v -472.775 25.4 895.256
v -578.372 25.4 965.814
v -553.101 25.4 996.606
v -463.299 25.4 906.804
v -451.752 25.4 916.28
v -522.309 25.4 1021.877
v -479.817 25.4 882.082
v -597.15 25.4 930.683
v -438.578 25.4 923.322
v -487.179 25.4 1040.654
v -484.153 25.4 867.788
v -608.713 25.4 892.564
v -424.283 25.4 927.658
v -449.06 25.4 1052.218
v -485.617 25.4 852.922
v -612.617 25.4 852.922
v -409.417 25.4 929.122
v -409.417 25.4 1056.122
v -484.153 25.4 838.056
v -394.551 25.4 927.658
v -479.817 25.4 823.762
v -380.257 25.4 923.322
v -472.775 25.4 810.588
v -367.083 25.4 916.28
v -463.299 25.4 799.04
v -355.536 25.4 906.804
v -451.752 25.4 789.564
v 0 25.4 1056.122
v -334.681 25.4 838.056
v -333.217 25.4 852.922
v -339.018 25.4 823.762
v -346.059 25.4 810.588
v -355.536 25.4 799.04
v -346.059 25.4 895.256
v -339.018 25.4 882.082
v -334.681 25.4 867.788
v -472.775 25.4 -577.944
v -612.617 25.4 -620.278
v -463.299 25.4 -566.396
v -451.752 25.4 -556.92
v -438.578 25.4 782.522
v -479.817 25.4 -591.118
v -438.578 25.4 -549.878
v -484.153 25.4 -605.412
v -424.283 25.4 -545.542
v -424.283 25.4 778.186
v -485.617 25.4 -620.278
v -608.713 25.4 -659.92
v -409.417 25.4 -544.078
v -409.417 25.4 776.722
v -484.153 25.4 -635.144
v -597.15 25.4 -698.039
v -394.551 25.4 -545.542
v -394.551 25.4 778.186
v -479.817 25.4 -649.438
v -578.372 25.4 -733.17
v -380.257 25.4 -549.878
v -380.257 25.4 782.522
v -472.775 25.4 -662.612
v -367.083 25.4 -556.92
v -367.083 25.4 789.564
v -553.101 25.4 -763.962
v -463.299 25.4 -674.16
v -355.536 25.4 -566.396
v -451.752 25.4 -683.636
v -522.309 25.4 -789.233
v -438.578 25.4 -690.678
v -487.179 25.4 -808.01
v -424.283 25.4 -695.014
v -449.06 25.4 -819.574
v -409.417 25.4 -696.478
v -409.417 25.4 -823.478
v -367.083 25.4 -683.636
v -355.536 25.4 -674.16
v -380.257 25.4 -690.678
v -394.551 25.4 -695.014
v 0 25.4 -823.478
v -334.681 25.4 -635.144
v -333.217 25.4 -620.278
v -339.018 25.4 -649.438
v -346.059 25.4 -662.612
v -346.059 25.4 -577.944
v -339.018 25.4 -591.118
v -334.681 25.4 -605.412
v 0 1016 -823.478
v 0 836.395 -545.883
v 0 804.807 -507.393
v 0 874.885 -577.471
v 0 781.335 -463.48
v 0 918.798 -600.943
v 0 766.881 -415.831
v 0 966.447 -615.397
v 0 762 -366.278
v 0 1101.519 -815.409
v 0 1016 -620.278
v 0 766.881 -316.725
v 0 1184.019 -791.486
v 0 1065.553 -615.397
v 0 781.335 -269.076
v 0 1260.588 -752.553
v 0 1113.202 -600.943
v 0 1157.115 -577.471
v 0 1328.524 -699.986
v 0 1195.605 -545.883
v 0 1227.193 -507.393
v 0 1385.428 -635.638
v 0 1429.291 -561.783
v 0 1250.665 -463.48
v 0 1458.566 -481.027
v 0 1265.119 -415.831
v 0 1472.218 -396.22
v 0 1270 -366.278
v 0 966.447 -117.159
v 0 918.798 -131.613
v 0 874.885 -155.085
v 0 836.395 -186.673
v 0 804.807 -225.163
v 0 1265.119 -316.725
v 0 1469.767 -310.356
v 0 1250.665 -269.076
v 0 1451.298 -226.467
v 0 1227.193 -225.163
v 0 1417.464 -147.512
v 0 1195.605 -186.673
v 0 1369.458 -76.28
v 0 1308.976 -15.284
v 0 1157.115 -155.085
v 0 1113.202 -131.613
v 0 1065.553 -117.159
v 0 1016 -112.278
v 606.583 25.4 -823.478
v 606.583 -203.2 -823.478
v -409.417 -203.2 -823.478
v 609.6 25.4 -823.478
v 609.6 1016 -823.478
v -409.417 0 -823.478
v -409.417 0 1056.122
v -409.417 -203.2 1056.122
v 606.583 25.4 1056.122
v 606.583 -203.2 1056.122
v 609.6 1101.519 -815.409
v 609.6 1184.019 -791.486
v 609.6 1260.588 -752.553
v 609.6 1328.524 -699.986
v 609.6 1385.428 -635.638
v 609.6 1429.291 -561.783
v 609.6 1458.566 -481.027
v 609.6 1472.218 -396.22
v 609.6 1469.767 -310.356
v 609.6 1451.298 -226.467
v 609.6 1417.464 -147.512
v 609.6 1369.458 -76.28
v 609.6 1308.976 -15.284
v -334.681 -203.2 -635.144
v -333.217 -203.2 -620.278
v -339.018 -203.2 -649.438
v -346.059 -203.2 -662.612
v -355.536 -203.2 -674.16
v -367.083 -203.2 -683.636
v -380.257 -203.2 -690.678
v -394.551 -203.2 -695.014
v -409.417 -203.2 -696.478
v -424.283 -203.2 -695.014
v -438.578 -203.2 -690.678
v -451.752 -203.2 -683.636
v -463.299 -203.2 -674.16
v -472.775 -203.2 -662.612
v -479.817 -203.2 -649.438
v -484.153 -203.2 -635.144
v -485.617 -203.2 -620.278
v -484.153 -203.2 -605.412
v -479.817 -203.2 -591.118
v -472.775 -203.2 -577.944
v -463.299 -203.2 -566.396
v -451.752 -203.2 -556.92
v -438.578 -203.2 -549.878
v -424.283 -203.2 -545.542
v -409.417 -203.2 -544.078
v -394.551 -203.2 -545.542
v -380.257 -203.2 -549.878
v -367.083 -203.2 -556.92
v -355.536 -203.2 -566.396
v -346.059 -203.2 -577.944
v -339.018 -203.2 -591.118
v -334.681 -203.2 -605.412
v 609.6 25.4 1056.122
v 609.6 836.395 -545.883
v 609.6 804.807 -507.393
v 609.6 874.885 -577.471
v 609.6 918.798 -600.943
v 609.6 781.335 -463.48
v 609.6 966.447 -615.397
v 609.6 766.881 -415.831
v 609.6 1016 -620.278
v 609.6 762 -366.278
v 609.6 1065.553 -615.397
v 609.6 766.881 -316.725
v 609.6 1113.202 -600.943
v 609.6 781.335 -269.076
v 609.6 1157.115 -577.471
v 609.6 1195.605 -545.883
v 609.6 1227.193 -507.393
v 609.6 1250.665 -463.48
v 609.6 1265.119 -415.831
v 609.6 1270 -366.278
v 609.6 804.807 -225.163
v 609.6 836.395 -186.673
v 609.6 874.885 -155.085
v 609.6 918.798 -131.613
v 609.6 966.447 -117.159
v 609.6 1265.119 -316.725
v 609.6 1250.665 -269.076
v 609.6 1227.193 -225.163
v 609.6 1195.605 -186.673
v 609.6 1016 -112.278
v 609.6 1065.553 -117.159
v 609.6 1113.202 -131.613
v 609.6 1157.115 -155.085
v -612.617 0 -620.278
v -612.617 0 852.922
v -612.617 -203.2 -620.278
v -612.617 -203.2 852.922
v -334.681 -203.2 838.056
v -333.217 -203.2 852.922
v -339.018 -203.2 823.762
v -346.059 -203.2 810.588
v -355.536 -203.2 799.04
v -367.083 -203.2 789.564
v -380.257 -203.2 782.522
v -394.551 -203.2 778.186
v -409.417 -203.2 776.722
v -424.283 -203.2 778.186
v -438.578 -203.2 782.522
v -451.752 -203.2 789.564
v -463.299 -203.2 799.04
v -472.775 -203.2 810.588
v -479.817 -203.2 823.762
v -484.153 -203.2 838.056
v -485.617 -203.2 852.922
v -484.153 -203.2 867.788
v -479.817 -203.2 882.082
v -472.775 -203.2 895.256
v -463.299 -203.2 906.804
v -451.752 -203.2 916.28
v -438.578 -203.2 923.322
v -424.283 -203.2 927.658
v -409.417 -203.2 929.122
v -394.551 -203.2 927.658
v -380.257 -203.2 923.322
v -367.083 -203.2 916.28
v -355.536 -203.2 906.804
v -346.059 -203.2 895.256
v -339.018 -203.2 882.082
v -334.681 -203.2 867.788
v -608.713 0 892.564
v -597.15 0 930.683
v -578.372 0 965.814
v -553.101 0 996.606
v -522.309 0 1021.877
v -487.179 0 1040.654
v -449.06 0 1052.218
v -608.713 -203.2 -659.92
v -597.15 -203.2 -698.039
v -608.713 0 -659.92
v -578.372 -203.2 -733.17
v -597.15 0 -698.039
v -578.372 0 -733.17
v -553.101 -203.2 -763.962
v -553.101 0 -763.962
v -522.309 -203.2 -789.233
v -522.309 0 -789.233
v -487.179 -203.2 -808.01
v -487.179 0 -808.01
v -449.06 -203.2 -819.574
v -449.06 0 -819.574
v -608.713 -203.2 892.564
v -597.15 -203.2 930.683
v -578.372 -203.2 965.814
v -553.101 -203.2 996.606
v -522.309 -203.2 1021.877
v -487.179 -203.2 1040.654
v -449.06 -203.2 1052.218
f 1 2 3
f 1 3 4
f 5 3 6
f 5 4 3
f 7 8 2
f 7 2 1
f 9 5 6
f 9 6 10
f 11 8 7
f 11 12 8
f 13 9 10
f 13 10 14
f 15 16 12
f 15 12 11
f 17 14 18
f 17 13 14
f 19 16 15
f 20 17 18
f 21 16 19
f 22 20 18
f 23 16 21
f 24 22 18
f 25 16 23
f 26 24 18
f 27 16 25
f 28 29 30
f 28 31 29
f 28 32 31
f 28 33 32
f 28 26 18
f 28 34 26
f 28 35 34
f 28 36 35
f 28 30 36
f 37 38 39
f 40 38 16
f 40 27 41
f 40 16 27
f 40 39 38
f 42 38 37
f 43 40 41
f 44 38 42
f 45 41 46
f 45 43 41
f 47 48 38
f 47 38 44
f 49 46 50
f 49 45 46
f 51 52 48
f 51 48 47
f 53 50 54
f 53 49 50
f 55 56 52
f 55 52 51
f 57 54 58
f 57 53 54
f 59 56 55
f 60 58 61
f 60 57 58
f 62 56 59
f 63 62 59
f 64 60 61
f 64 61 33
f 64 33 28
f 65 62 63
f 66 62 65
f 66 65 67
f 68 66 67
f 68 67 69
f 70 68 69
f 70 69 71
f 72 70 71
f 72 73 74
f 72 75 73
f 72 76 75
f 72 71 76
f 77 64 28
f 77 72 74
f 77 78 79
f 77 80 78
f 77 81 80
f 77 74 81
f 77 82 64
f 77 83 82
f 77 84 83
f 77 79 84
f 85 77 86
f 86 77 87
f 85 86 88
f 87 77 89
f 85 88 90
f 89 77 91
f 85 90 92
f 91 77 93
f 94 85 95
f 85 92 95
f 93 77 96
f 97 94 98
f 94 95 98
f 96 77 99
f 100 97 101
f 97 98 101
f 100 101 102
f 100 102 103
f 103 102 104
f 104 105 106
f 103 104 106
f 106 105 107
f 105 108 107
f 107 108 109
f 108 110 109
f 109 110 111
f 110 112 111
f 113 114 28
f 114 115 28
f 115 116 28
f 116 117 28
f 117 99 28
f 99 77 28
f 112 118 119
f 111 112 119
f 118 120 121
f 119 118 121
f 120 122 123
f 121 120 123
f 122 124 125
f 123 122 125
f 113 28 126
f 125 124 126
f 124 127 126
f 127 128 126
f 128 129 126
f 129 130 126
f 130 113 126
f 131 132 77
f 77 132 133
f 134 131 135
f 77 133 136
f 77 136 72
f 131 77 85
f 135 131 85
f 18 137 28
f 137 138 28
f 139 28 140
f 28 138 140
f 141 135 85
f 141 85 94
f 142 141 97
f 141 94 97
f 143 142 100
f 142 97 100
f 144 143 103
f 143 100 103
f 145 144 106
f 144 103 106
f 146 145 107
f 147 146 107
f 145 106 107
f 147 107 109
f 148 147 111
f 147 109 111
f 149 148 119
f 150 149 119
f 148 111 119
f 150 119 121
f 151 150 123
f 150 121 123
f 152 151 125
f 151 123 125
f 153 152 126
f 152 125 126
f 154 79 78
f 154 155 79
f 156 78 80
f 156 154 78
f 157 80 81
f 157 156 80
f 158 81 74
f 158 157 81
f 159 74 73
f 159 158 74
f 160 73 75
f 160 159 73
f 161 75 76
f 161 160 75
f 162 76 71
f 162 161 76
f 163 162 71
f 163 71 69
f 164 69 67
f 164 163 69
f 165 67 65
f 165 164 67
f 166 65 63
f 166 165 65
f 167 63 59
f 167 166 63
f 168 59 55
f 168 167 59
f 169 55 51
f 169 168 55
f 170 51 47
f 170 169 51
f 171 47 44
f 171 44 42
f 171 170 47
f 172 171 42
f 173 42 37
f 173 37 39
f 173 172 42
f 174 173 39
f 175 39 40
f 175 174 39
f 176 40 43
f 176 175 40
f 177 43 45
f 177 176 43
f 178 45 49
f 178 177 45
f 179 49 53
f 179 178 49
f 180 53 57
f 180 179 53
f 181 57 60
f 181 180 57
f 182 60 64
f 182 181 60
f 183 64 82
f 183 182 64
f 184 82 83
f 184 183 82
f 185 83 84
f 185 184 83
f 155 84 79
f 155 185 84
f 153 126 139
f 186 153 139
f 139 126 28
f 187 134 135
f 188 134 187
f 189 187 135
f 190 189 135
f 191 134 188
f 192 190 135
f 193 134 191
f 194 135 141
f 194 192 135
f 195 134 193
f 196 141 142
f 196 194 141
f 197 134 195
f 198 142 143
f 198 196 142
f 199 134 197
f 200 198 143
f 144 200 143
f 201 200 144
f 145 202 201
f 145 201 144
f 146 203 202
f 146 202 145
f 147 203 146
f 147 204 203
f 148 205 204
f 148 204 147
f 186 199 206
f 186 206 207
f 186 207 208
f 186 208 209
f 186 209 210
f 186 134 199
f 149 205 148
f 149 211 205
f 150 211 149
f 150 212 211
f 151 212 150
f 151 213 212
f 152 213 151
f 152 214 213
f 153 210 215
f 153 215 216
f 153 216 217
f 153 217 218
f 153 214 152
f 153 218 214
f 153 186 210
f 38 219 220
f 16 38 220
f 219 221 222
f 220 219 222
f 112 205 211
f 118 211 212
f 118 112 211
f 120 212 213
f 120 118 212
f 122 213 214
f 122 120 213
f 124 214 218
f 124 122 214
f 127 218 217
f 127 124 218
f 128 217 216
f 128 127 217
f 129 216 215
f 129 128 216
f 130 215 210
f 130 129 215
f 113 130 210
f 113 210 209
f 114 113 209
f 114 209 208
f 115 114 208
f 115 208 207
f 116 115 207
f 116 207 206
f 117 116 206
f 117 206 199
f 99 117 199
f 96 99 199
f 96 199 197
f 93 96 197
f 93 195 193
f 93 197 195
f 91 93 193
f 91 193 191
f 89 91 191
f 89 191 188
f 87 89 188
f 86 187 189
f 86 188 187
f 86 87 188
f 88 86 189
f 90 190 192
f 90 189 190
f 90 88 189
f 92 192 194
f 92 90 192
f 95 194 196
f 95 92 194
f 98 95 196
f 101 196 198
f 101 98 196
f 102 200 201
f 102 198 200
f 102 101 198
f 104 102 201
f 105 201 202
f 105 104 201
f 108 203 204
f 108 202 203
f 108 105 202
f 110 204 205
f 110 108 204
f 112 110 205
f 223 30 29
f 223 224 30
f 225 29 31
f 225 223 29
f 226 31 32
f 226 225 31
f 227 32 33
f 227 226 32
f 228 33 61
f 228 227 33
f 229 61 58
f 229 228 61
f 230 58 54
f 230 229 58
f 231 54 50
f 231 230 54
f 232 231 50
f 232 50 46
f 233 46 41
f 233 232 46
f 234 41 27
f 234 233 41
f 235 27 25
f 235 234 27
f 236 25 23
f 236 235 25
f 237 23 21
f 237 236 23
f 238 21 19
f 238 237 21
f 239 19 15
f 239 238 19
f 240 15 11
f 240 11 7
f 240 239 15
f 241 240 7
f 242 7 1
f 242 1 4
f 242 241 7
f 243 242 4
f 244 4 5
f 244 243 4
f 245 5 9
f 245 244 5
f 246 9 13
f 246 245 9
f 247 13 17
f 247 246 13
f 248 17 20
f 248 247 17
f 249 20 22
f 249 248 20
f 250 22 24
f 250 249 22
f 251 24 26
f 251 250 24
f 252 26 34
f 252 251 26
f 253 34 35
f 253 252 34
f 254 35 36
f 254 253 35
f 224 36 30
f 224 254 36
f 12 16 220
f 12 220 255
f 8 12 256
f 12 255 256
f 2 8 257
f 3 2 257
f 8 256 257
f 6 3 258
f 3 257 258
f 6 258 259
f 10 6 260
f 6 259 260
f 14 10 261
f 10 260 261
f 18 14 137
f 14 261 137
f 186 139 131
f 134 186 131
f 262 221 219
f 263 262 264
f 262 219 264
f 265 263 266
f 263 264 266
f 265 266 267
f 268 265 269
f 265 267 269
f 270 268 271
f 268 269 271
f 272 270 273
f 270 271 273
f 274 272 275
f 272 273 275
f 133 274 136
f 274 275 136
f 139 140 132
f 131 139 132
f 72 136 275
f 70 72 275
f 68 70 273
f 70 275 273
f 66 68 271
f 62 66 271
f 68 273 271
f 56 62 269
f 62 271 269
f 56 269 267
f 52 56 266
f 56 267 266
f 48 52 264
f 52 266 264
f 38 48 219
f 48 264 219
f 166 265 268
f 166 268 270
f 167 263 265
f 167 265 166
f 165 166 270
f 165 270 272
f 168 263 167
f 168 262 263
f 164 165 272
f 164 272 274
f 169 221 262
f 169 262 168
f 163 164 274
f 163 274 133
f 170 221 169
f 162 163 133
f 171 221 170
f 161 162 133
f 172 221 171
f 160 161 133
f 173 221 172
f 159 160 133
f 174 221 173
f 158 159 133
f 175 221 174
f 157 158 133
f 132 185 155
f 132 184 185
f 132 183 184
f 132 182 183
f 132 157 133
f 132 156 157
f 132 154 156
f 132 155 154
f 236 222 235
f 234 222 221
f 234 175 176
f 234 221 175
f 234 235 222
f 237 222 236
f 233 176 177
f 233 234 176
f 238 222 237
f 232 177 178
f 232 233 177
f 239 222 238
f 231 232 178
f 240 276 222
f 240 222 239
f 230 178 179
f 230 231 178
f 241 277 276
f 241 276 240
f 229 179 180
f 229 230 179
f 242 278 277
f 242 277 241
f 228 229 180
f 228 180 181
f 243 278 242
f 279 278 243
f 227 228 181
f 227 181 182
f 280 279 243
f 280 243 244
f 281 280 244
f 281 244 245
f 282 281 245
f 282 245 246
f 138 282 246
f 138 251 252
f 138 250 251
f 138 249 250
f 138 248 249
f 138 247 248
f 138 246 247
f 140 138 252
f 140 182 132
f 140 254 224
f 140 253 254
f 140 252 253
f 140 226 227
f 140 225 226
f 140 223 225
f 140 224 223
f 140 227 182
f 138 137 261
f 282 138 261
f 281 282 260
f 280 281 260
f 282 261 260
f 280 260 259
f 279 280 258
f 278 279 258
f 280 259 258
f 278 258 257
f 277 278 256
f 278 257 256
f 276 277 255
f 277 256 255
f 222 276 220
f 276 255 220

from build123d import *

# Parameters (mm, degrees)
F0_R      = 76.2
F1_DEPTH  = 203.2
F1_FACE_R = 76.2
F2_DEPTH  = 25.4
F5_DEPTH  = 609.6
F6_R      = 254
F7_DEPTH  = 1488.44


with BuildPart() as f1:
    # F0 (on Front) → F1 (new body)
    with BuildSketch(Plane.XZ):
        with BuildLine():
            Line((606.582717, -823.478018), (606.582717, 1056.121982))
            Line((606.582717, 1056.121982), (-409.417283, 1056.121982))
            ThreePointArc((-409.417283, 1056.121982), (-553.101381, 996.60608), (-612.617283, 852.921982))
            Line((-612.617283, 852.921982), (-612.617283, -620.278018))
            ThreePointArc((-612.617283, -620.278018), (-553.101381, -763.962116), (-409.417283, -823.478018))
            Line((-409.417283, -823.478018), (606.582717, -823.478018))
        make_face()
        with Locations((-409.417283, -620.278018)):
            Circle(F0_R, mode=Mode.SUBTRACT)
        with Locations((-409.417283, 852.921982)):
            Circle(F0_R, mode=Mode.SUBTRACT)
    extrude(amount=F1_DEPTH)

    # F1_face (on face) → F2 (join)
    with BuildSketch(Plane(origin=(8.078428, 0, 116.321982), x_dir=(1, 0, 0), z_dir=(0, 1, 0))):
        with BuildLine():
            Line((598.504289, -939.8), (598.504289, 939.8))
            Line((598.504289, 939.8), (-417.495711, 939.8))
            ThreePointArc((-417.495711, 939.8), (-561.179808, 880.284098), (-620.695711, 736.6))
            Line((-620.695711, 736.6), (-620.695711, -736.6))
            ThreePointArc((-620.695711, -736.6), (-561.179808, -880.284098), (-417.495711, -939.8))
            Line((-417.495711, -939.8), (598.504289, -939.8))
        make_face()
        with Locations((-417.495711, 736.6)):
            Circle(F1_FACE_R, mode=Mode.SUBTRACT)
        with Locations((-417.495711, -736.6)):
            Circle(F1_FACE_R, mode=Mode.SUBTRACT)
    extrude(amount=F2_DEPTH)

    # F4 (on Right) → F5 (join)
    with BuildSketch(Plane.YZ):
        with BuildLine():
            Line((25.4, -823.478018), (1016, -823.478018))
            ThreePointArc((1016, -823.478018), (1445.829228, -522.094174), (1308.976107, -15.283943))
            Line((1308.976107, -15.283943), (25.4, 1056.121982))
            Line((25.4, 1056.121982), (25.4, -823.478018))
        make_face()
    extrude(amount=F5_DEPTH)

    # F6 (on face) → F7 (cut)
    with BuildSketch(Plane.YZ):
        with Locations((1016, -366.278018)):
            Circle(F6_R)
    extrude(amount=F7_DEPTH, mode=Mode.SUBTRACT)


solid = f1.part
